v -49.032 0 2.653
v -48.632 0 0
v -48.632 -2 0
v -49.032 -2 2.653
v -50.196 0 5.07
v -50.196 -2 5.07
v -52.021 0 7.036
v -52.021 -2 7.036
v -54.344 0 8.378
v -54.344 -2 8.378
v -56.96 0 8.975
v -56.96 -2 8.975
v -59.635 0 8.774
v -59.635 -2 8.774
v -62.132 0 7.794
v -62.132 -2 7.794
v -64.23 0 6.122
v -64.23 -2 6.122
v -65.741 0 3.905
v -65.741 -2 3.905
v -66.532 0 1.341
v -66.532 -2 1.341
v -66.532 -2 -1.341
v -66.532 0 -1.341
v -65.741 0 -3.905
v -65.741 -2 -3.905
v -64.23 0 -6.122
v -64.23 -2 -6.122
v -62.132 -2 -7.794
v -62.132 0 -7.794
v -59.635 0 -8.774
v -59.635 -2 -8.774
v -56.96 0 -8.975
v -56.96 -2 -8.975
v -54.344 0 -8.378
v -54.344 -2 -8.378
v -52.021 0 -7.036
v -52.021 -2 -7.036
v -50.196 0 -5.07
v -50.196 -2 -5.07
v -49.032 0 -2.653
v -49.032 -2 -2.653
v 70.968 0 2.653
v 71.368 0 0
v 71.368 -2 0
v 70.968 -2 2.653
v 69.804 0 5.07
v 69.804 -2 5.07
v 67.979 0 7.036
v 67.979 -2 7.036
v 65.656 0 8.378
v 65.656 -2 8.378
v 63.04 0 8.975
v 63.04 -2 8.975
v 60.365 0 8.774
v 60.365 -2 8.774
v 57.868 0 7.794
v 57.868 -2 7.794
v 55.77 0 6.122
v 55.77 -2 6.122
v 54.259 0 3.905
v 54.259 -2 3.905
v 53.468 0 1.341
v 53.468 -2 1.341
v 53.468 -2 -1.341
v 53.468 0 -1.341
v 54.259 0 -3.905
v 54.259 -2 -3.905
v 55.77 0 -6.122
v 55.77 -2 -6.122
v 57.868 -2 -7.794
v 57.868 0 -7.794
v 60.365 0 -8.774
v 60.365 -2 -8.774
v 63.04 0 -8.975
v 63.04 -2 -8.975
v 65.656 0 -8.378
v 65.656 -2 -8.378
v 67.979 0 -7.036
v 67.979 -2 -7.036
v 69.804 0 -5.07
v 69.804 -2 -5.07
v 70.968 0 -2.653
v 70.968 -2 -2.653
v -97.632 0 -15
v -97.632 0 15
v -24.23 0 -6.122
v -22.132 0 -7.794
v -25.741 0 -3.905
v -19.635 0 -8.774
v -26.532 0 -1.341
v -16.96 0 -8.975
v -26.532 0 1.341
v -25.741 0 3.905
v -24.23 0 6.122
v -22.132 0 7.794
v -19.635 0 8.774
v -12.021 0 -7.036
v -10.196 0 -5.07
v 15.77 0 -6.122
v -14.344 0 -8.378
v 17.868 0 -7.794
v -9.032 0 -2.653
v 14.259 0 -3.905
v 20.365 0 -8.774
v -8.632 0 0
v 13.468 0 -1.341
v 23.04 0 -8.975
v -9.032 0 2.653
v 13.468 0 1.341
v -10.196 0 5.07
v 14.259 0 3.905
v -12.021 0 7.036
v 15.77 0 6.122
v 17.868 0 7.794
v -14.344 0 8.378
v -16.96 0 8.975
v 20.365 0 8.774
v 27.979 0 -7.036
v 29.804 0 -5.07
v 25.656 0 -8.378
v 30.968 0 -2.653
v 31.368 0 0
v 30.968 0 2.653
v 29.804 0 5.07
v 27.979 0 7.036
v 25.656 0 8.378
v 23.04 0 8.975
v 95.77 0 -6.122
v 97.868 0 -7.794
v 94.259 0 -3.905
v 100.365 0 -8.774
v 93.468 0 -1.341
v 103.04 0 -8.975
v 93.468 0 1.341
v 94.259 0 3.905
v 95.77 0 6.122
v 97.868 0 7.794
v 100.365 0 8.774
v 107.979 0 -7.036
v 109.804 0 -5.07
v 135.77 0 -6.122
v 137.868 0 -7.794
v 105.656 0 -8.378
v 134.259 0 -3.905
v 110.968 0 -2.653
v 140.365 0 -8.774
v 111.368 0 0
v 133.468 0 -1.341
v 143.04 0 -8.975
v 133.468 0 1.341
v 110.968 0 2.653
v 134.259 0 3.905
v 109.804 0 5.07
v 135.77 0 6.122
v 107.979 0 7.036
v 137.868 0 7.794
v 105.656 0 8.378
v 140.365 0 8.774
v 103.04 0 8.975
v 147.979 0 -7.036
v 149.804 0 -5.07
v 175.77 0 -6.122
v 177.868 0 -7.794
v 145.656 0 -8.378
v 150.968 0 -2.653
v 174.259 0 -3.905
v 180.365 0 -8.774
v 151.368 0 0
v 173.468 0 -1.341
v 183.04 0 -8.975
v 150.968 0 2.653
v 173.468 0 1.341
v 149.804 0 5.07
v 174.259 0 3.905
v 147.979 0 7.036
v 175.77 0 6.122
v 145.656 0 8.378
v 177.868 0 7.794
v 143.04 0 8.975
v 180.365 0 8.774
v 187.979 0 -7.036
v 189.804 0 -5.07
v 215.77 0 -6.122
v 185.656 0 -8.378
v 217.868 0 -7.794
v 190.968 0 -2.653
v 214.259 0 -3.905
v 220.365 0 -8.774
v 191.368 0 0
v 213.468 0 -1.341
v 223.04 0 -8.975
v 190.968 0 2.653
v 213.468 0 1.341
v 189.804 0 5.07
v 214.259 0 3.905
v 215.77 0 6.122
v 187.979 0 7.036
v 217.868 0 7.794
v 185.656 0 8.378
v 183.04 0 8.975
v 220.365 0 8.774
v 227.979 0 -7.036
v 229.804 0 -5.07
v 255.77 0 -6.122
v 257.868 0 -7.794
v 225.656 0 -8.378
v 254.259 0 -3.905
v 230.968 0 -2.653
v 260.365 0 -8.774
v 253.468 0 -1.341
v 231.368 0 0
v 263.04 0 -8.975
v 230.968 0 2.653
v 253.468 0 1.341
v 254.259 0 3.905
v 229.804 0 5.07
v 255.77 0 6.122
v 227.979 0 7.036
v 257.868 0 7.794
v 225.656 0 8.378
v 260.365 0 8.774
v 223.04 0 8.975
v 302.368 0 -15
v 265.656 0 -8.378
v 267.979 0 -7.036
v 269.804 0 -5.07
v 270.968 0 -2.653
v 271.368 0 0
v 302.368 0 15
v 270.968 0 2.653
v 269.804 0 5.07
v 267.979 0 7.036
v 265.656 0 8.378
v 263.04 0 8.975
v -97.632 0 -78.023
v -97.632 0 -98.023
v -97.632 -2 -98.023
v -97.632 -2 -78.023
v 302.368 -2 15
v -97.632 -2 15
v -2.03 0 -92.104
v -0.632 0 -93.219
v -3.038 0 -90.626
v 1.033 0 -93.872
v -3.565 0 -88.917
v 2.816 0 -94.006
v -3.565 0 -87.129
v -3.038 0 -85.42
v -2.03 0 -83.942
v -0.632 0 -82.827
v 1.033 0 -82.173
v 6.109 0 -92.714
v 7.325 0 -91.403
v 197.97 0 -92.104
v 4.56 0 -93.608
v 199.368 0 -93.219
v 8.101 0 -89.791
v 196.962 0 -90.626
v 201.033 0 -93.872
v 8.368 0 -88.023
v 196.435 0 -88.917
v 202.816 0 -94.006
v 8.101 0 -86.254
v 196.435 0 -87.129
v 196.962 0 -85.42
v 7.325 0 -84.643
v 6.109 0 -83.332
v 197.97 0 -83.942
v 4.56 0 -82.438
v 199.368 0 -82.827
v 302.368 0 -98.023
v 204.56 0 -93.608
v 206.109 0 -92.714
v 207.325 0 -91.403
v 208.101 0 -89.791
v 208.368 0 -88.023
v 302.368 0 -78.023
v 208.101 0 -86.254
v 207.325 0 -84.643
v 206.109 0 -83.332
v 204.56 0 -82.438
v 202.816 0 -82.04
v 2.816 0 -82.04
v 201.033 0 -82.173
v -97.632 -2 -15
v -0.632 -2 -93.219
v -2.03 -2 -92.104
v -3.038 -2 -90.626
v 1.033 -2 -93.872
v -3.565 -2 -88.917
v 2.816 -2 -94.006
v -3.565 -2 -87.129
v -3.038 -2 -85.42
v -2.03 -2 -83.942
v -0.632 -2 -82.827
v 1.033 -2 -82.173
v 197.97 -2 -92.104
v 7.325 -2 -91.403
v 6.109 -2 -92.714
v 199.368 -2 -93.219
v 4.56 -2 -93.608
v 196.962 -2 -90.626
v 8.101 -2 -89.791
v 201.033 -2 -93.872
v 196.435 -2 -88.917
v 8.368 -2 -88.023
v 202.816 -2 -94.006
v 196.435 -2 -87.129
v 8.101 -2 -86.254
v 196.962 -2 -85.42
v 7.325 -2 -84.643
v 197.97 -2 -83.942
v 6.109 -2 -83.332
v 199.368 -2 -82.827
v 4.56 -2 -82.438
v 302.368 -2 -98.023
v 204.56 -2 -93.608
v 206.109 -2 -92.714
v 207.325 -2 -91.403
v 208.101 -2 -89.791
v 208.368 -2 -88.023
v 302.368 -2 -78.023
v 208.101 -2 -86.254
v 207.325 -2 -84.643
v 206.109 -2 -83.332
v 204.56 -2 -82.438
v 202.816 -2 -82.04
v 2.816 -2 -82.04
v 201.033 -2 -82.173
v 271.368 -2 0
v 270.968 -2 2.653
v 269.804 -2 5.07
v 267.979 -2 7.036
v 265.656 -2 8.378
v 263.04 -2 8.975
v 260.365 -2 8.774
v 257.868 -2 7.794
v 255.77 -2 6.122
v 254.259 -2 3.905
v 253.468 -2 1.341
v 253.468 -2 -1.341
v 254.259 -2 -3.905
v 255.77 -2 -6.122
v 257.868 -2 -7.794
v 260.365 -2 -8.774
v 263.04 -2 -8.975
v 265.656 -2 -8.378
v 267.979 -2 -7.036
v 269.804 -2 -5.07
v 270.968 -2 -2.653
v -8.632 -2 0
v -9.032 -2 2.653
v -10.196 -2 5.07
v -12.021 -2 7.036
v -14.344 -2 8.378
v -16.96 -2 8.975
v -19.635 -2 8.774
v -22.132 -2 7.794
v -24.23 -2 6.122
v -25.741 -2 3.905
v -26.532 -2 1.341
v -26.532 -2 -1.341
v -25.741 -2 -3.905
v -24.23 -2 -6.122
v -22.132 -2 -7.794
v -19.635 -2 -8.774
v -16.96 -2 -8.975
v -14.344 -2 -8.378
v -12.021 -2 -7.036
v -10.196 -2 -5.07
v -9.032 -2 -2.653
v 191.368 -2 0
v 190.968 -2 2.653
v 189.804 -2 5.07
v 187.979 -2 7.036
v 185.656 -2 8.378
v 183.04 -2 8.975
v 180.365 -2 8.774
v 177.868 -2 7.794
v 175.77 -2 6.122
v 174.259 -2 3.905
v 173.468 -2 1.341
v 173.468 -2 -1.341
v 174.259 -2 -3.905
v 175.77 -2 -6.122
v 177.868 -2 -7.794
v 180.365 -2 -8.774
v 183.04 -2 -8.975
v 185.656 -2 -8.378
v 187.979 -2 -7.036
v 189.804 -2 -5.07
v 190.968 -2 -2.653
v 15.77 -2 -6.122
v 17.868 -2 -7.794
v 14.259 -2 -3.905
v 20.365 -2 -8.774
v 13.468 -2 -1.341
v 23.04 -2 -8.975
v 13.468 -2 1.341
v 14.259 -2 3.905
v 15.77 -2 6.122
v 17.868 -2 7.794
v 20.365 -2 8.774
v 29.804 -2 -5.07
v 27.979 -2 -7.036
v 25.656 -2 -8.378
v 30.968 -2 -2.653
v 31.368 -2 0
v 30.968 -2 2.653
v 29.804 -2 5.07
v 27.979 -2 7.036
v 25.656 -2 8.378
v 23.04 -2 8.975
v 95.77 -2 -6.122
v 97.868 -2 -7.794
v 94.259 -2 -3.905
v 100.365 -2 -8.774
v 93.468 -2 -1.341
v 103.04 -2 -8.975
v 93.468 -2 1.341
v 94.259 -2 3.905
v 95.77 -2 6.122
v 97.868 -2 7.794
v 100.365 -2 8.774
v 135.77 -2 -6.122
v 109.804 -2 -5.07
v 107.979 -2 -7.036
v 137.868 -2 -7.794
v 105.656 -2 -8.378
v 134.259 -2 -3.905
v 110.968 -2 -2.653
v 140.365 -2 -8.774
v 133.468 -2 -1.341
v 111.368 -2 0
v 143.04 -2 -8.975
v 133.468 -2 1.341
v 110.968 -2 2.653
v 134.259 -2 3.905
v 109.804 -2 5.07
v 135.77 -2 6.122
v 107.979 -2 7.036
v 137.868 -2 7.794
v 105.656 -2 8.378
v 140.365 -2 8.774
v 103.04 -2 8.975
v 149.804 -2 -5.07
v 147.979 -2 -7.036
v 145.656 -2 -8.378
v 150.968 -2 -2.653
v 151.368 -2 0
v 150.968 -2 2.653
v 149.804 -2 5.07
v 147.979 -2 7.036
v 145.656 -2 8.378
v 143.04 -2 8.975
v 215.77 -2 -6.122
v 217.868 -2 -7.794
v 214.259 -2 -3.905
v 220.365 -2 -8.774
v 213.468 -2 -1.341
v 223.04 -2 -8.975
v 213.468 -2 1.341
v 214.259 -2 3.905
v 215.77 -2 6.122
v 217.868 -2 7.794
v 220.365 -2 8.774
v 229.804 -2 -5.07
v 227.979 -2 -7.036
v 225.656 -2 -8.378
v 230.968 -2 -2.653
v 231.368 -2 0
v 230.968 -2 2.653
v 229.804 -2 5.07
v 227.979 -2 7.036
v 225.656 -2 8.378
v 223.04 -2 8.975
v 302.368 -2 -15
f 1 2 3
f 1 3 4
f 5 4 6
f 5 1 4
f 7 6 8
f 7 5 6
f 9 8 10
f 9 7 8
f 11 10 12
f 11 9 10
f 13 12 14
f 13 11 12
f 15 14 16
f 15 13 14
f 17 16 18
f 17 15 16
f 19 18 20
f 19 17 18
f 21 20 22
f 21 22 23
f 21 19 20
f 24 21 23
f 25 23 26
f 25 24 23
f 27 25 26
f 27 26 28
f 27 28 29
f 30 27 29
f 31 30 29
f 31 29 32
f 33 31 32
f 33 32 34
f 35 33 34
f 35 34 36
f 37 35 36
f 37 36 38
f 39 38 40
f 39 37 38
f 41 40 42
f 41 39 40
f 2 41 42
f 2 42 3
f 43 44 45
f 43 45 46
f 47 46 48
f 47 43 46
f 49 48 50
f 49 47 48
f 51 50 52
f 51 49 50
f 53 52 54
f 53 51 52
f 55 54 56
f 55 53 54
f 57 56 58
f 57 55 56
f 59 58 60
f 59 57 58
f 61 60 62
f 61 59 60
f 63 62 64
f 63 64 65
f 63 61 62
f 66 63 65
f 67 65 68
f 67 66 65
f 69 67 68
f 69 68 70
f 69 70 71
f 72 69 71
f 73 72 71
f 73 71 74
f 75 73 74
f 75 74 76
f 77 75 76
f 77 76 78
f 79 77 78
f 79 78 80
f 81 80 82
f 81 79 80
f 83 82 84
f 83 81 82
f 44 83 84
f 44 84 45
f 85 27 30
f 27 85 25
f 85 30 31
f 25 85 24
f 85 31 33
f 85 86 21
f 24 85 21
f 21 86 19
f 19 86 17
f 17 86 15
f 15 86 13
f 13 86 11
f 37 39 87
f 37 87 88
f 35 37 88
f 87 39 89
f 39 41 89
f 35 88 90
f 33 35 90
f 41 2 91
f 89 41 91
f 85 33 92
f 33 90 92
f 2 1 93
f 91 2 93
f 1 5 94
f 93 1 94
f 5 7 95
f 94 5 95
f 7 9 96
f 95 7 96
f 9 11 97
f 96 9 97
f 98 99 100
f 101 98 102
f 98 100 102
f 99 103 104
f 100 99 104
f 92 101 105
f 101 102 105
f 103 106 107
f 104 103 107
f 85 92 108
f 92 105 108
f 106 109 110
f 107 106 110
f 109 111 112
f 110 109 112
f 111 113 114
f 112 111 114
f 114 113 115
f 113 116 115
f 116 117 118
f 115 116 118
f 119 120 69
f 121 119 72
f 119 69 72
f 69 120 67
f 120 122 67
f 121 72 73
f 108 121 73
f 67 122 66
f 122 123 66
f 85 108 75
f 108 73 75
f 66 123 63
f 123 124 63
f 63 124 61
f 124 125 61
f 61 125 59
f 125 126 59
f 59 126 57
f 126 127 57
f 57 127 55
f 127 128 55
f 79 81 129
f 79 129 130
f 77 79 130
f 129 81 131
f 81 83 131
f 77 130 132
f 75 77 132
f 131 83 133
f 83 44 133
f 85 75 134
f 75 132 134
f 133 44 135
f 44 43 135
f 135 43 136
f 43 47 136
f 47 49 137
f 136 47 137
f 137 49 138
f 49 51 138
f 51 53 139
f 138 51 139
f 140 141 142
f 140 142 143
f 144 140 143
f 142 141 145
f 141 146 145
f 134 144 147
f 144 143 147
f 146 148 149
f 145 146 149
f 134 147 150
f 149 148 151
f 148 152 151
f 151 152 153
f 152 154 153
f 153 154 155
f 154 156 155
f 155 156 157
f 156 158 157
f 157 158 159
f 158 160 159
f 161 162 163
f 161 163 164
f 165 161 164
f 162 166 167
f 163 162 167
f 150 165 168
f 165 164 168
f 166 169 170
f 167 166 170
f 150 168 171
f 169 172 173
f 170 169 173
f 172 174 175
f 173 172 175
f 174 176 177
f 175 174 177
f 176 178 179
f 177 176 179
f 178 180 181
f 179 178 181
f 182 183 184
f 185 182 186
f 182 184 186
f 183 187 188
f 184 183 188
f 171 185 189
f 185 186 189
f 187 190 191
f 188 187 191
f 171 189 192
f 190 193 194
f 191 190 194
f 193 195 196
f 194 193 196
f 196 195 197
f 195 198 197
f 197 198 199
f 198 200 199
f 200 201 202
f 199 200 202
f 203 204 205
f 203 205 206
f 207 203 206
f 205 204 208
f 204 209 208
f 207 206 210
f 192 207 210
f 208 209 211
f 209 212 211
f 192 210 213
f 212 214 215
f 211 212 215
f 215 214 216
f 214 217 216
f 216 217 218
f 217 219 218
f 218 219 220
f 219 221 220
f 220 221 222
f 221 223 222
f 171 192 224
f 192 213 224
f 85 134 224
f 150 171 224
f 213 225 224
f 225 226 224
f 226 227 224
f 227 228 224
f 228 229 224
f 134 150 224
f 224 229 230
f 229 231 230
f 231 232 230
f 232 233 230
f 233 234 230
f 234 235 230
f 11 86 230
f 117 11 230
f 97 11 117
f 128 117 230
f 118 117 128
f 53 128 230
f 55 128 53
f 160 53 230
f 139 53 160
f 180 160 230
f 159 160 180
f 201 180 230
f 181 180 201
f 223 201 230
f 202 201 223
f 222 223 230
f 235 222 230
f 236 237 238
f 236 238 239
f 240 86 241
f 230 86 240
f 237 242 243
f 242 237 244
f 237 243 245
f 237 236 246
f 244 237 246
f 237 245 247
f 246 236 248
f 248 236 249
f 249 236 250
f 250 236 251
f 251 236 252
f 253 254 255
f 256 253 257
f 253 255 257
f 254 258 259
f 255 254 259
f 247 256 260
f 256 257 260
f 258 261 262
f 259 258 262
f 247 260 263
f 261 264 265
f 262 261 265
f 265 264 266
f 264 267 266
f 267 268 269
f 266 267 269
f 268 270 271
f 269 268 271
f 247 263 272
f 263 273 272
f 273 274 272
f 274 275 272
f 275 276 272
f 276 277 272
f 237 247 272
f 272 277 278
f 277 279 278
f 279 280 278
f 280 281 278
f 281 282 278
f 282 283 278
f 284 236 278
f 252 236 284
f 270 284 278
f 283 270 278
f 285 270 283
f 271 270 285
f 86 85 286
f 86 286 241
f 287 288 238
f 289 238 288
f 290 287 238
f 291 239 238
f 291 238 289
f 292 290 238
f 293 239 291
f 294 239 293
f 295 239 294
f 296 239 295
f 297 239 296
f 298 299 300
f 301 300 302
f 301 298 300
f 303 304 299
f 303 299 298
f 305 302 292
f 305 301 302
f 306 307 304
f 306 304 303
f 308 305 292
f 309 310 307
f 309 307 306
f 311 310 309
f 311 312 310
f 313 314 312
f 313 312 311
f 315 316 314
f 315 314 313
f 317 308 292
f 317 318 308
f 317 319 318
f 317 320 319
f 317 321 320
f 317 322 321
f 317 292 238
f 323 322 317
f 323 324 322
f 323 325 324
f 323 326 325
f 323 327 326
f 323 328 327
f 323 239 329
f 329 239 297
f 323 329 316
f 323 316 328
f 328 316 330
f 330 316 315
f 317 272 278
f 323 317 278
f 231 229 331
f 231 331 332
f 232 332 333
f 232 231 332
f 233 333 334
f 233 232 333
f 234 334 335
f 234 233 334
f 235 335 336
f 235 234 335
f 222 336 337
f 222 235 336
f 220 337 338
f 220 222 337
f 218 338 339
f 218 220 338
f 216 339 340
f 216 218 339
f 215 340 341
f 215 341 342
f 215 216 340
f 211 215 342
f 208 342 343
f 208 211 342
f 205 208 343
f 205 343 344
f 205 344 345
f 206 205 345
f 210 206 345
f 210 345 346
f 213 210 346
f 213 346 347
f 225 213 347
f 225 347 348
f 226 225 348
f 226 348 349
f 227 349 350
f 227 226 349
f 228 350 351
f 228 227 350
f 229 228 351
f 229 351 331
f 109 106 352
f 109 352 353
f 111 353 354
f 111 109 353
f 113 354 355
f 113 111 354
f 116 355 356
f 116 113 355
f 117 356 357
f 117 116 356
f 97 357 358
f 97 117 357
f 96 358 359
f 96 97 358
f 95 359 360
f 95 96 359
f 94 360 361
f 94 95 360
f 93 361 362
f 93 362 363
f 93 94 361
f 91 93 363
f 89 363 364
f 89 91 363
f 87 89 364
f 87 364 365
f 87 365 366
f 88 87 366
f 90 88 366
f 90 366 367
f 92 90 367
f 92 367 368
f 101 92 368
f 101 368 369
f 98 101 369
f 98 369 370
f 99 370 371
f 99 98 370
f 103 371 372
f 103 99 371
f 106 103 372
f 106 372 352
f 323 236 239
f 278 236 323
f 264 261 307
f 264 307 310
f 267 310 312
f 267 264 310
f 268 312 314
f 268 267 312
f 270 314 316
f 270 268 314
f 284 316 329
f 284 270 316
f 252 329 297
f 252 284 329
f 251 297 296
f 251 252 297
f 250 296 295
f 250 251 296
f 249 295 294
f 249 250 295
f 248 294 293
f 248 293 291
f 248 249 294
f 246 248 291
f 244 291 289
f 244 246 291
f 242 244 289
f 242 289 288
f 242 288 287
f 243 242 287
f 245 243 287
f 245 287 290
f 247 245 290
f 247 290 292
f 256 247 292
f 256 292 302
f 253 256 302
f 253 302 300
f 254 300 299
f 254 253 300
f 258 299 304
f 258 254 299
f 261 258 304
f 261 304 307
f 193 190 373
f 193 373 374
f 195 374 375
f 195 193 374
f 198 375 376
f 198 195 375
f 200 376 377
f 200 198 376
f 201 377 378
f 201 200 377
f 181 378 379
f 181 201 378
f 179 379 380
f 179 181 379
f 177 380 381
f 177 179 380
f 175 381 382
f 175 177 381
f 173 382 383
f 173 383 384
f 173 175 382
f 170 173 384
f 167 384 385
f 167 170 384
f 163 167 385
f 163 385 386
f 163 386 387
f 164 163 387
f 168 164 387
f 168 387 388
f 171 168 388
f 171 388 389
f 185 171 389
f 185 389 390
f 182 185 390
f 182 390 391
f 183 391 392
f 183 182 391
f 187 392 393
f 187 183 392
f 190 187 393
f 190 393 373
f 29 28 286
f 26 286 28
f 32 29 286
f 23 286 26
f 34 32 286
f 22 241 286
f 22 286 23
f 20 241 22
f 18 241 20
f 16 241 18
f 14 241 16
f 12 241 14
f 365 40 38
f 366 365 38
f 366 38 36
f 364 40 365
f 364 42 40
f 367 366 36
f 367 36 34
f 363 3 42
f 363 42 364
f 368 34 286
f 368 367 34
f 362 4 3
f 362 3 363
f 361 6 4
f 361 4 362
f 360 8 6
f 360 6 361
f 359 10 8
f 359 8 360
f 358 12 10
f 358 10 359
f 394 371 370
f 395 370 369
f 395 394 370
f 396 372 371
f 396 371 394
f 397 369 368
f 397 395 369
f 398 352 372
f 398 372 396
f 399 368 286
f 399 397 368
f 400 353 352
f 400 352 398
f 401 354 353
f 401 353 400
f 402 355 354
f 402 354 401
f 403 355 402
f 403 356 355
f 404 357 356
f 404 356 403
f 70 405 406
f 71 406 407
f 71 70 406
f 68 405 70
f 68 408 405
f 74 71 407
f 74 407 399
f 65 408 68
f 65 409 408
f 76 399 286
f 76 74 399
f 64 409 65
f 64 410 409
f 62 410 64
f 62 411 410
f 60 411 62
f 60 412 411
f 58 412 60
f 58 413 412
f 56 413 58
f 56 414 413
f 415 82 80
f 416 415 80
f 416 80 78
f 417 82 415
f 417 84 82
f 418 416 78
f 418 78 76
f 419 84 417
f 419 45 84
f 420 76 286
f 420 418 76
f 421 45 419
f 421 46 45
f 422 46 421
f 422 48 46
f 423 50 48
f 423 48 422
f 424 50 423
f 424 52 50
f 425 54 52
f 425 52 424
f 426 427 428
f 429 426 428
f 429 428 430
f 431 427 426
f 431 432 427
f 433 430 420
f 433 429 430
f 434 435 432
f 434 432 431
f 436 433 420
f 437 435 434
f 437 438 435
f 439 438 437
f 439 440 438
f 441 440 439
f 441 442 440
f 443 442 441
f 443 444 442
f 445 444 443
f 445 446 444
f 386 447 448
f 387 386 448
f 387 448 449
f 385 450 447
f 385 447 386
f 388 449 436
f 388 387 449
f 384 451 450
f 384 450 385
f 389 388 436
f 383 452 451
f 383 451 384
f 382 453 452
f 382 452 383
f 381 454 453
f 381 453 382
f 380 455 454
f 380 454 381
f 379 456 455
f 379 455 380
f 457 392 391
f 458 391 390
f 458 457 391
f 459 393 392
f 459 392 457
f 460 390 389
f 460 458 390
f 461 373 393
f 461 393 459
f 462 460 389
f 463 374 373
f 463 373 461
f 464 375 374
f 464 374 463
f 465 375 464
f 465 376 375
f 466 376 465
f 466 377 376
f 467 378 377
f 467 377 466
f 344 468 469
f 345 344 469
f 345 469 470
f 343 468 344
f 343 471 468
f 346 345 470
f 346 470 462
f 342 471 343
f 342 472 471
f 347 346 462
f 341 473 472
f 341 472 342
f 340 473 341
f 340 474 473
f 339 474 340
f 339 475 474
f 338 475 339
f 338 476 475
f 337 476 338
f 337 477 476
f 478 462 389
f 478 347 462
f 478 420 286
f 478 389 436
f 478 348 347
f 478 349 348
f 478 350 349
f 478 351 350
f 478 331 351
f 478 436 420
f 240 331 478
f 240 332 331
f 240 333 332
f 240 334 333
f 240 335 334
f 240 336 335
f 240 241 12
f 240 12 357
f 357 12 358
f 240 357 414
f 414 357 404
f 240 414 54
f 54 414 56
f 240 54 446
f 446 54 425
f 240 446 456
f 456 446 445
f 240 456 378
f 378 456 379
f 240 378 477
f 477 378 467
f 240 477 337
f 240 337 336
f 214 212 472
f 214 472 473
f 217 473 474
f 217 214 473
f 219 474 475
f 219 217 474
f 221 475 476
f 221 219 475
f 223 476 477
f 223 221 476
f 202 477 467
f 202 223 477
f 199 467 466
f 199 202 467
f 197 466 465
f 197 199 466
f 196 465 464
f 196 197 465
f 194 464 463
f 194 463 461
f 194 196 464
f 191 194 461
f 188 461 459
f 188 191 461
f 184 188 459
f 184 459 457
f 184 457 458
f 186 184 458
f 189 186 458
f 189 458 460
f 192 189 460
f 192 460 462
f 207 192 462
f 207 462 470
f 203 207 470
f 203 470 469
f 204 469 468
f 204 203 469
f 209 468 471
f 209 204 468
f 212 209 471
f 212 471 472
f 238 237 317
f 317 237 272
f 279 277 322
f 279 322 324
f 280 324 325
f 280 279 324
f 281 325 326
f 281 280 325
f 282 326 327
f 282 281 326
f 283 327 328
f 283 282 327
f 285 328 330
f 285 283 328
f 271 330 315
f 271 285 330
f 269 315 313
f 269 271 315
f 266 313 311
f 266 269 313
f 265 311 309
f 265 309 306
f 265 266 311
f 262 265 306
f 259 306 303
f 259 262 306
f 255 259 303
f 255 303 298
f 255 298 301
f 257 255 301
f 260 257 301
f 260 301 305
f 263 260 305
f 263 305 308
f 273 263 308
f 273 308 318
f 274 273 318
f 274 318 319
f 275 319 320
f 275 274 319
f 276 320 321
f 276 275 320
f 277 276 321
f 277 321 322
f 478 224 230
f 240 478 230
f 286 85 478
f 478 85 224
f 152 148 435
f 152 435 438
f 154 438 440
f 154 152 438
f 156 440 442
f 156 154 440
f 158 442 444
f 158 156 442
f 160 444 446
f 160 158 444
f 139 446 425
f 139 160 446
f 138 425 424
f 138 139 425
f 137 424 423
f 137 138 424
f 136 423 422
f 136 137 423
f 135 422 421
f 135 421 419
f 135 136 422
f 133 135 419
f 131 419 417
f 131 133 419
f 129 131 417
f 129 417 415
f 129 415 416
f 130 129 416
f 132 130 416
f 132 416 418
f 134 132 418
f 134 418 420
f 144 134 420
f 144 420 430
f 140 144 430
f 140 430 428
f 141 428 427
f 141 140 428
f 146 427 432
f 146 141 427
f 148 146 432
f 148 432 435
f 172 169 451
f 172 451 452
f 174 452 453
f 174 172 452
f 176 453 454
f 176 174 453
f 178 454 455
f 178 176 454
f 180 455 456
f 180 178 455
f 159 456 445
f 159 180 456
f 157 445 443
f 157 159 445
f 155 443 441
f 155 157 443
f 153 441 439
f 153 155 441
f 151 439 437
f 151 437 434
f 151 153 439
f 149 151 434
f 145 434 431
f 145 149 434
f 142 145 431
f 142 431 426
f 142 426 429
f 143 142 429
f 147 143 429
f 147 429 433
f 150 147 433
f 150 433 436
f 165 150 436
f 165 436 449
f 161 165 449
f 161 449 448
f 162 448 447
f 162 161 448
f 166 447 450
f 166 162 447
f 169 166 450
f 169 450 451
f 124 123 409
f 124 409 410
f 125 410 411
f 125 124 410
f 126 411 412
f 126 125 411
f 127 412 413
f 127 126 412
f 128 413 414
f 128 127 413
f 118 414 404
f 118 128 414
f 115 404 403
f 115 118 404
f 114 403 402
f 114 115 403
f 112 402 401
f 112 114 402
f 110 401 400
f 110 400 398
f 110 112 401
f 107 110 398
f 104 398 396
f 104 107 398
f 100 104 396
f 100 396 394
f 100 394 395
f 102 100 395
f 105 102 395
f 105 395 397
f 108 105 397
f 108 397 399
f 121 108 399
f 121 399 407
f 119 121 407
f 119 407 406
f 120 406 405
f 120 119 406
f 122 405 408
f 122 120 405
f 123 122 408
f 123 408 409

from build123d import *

# Parameters (mm, degrees)
F0_W     = 400
F0_H     = 30
F0_R     = 9
F0_H_2   = 20
F0_R_2   = 6
F1_DEPTH = 2


with BuildPart() as f1:
    # F0 (on Front) → F1 (new body)
    with BuildSketch(Plane.XZ):
        with Locations((102.367896, 0)):
            Rectangle(F0_W, F0_H)
        with Locations((-57.632104, 0)):
            Circle(F0_R, mode=Mode.SUBTRACT)
        with Locations((-17.632104, 0)):
            Circle(F0_R, mode=Mode.SUBTRACT)
        with Locations((22.367896, 0)):
            Circle(F0_R, mode=Mode.SUBTRACT)
        with Locations((62.367896, 0)):
            Circle(F0_R, mode=Mode.SUBTRACT)
        with Locations((102.367896, 0)):
            Circle(F0_R, mode=Mode.SUBTRACT)
        with Locations((142.367896, 0)):
            Circle(F0_R, mode=Mode.SUBTRACT)
        with Locations((182.367896, 0)):
            Circle(F0_R, mode=Mode.SUBTRACT)
        with Locations((222.367896, 0)):
            Circle(F0_R, mode=Mode.SUBTRACT)
        with Locations((262.367896, 0)):
            Circle(F0_R, mode=Mode.SUBTRACT)
        with Locations((102.367896, -88.022899)):
            Rectangle(F0_W, F0_H_2)
        with Locations((2.367896, -88.022899)):
            Circle(F0_R_2, mode=Mode.SUBTRACT)
        with Locations((202.367896, -88.022899)):
            Circle(F0_R_2, mode=Mode.SUBTRACT)
    extrude(amount=F1_DEPTH)


solid = f1.part
